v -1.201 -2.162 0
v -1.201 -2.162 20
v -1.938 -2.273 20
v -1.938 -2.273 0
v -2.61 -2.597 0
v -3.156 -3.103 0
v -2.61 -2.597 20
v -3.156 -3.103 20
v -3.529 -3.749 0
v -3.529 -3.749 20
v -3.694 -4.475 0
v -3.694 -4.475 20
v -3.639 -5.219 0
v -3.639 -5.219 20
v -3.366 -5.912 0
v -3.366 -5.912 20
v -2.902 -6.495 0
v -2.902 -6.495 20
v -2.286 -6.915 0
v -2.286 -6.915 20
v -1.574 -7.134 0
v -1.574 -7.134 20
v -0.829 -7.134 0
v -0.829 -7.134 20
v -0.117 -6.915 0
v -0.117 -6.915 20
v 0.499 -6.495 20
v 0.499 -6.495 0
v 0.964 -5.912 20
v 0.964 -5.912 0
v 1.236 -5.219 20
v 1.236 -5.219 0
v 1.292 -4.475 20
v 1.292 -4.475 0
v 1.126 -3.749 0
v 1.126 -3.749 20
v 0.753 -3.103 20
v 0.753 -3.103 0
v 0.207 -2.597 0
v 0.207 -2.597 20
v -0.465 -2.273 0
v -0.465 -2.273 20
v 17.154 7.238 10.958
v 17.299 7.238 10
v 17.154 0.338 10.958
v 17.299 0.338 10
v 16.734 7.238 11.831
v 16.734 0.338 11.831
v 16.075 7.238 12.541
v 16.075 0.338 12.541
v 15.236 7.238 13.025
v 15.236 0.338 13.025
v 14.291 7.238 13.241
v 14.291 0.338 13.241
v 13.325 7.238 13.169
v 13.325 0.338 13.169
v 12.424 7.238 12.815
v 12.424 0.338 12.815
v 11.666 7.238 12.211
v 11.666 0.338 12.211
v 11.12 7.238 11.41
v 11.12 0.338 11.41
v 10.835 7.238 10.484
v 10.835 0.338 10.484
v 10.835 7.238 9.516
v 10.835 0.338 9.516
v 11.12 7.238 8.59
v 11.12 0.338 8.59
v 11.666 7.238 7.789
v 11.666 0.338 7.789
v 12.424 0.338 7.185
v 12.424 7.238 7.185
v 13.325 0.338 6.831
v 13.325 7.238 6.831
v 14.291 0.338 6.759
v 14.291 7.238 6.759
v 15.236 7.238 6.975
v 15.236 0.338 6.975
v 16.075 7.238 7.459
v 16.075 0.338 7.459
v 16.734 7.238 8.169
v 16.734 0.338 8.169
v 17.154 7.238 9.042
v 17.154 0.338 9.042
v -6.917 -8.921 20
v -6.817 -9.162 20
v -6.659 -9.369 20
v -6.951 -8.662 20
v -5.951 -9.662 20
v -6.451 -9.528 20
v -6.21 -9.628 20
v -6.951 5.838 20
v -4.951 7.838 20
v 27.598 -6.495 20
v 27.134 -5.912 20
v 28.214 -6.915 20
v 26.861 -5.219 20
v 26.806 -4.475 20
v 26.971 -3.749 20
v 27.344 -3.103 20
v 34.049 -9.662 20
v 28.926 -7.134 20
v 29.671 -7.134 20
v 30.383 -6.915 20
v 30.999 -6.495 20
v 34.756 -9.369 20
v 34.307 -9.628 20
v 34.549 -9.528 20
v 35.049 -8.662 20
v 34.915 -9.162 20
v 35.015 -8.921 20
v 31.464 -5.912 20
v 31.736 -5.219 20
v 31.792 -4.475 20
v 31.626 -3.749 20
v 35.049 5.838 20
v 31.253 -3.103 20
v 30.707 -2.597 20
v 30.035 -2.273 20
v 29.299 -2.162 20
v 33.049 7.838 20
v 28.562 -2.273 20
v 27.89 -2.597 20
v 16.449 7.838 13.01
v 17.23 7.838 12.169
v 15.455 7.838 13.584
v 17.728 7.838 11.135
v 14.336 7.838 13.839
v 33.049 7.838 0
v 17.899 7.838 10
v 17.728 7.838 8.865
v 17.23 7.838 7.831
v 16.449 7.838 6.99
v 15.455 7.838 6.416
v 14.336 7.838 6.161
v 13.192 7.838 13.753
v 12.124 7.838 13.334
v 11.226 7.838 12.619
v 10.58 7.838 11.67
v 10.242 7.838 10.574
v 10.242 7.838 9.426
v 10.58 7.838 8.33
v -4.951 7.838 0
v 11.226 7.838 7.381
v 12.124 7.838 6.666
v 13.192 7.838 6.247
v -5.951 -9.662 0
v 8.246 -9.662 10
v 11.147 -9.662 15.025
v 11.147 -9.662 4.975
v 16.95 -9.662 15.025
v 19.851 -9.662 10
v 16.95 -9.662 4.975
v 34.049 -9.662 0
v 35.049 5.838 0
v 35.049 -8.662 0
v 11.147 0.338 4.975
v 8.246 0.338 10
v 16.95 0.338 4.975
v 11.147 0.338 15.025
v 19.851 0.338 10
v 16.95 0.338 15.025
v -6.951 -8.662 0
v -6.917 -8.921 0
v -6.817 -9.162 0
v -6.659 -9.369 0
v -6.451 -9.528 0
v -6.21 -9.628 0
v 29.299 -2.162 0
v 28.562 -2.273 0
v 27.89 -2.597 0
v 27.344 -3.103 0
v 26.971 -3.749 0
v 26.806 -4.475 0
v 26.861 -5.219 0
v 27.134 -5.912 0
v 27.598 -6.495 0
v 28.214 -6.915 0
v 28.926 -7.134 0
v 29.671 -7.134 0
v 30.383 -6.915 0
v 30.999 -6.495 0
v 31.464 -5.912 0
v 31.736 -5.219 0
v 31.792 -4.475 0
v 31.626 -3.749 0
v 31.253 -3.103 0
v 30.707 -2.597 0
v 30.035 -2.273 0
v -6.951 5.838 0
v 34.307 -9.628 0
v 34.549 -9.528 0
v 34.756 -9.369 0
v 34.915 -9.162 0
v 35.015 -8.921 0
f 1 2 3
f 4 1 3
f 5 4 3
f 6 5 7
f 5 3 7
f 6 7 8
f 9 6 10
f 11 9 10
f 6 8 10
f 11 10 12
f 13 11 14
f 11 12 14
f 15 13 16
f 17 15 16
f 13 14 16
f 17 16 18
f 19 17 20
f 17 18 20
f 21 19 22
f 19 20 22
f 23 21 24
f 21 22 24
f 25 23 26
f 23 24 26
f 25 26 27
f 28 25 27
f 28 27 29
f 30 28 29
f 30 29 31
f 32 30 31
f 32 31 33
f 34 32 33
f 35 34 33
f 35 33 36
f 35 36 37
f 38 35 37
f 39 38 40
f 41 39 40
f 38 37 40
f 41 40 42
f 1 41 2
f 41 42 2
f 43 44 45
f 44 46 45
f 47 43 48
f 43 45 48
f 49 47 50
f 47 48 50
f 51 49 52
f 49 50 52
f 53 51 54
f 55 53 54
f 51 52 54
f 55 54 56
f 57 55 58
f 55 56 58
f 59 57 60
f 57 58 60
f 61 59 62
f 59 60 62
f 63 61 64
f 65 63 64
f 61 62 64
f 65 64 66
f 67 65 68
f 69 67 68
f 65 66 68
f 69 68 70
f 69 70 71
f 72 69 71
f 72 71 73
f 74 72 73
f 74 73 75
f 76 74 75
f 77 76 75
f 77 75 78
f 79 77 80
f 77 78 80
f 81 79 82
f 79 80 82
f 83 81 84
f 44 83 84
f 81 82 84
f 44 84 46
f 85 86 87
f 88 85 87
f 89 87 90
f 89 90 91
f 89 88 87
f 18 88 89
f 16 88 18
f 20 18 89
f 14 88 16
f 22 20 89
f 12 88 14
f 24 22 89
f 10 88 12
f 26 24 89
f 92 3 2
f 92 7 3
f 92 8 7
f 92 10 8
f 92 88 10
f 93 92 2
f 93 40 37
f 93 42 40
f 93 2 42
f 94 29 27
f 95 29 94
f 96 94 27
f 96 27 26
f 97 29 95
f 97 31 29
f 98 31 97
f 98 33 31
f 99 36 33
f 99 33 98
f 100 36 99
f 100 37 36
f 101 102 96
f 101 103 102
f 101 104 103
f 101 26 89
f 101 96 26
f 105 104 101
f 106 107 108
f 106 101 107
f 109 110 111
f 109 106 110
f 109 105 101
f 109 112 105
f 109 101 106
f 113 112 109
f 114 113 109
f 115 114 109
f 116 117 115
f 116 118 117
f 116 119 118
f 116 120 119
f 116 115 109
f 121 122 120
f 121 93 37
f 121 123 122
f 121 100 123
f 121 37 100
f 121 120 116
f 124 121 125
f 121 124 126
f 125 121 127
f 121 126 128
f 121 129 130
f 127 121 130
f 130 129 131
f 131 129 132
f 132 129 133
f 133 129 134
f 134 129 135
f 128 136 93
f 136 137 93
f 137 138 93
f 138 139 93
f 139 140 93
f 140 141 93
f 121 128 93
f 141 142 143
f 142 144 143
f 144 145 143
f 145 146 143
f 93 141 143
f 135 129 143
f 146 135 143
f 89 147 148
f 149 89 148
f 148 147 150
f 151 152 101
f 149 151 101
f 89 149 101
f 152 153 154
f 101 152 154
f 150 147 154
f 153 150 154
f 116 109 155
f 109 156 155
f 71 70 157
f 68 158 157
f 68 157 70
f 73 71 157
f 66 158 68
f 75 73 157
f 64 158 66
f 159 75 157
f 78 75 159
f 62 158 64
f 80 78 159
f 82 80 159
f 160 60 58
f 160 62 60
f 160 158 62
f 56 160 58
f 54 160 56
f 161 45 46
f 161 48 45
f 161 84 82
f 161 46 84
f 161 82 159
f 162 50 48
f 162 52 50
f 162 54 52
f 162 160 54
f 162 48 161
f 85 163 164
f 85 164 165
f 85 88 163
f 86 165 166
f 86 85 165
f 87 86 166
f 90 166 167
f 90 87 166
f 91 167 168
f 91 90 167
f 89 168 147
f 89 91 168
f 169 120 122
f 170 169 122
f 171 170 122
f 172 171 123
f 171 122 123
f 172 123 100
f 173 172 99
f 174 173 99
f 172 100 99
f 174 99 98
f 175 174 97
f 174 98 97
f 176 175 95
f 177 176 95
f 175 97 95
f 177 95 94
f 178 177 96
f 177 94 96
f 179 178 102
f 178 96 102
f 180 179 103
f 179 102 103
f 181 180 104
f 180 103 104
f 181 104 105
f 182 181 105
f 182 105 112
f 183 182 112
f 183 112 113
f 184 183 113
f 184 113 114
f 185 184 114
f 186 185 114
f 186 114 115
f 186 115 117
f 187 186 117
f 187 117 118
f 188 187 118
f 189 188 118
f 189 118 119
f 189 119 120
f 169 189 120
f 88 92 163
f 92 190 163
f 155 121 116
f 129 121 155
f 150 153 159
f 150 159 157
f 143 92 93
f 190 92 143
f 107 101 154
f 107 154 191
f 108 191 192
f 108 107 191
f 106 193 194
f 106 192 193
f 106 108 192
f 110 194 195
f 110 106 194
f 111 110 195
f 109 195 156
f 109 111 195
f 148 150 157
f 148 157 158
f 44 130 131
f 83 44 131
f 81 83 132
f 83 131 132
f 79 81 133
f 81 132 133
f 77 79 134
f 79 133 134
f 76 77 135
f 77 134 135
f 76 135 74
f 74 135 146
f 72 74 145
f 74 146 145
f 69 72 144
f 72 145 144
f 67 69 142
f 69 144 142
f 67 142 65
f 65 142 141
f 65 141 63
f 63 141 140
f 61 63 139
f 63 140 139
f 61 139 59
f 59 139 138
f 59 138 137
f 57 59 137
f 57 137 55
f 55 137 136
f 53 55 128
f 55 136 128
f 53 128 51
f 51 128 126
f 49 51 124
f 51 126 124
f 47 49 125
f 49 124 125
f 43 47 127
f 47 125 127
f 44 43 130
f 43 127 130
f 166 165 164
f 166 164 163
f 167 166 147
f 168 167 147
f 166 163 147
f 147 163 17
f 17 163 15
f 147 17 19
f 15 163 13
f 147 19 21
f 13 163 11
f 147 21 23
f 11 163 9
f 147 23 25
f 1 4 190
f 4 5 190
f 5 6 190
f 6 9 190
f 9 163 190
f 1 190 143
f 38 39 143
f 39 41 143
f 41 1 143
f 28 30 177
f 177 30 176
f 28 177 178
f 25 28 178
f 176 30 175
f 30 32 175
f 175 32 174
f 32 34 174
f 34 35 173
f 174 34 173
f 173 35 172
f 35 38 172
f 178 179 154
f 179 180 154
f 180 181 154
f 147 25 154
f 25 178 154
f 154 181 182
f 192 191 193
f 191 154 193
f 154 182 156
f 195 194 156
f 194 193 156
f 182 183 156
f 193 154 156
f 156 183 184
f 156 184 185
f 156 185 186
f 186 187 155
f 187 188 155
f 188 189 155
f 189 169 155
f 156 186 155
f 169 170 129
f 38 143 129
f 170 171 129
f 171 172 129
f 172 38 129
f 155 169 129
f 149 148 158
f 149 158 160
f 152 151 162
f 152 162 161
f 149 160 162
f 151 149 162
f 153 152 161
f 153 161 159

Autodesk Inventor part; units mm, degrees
ref_plane "YZ Plane" through (0, 0, 0) normal (1, 0, 0) x (0, 1, 0)
ref_plane "XZ Plane" through (0, 0, 0) normal (0, 1, 0) x (-1, 0, 0)
ref_plane "XY Plane" through (0, 0, 0) normal (0, 0, 1) x (1, 0, 0)
sketch "Szkic1" plane through (0, 0, 0) normal (0, 0, 1) x (1, 0, 0)
  line L0 (-6.9514, -9.6622) -> (35.0486, -9.6622)
  line L1 (35.0486, -9.6622) -> (35.0486, 7.8378)
  line L2 (35.0486, 7.8378) -> (-6.9514, 7.8378)
  line L3 (-6.9514, 7.8378) -> (-6.9514, -9.6622)
  point P0 (0, 0)
  point P1 (-1.2014, -4.6622)
  point P2 (29.2986, -4.6622)
  dimension "d0" = 42
  dimension "d1" = 17.5
  dimension "d2" = 5.75
  dimension "d3" = 5
  dimension "d4" = 5
  dimension "d5" = 5.75
extrude "Wyciągnięcie proste1" add sketch "Szkic1" along normal blind 20
hole "Otwór1" at (-1.2014, -4.6622, 0) at (29.2986, -4.6622, 0) direction (0, 0, 1) diameter 5 end through all
sketch "Szkic2" plane through (-6.9514, -9.6622, 0) normal (0, -1, 0) x (1, 0, 0)
  line L0 (0, 0) -> (42, 0) projected
  line L1 (42, 0) -> (42, 20) projected
  line L2 (0, 20) -> (42, 20) projected
  line L3 (0, 0) -> (0, 20) projected
  circle A0 centre (21, 10) radius 5.025
  line L4 (23.9012, 15.025) -> (26.8024, 10)
  line L5 (26.8024, 10) -> (23.9012, 4.975)
  line L6 (23.9012, 4.975) -> (18.0988, 4.975)
  line L7 (18.0988, 4.975) -> (15.1976, 10)
  line L8 (15.1976, 10) -> (18.0988, 15.025)
  line L9 (18.0988, 15.025) -> (23.9012, 15.025)
  circle A1 centre (21, 10) radius 3.25
  point P0 (6.9514, 0)
  point P1 (21, 15.025)
  dimension "d19" = 10.05
  dimension "d15" = 42
  dimension "d16" = 20
  dimension "d17" = 10
  dimension "d18" = 21
  dimension "d20" = 6.5
extrude "Wyciągnięcie proste2" cut sketch "Szkic2" against normal through all contours A1
extrude "Wyciągnięcie proste3" cut sketch "Szkic2" against normal blind 10 contours A0 | A0 L4 L5 | A0 L9 L4 | L5 L6 A0 | A0 L8 L9 | L6 L7 A0 | A0 L7 L8
chamfer "Faza1" distance 0.6 angle 45 1 edges at (10.7986, 7.8378, 10)
fillet "Zaokrąglenie1" radius 1 2 edges at (-6.9514, -9.6622, 10) (35.0486, -9.6622, 10)
chamfer "Faza2" distance 2 angle 45 2 edges at (-6.9514, 7.8378, 10) (35.0486, 7.8378, 10)
equation "\"d4\" = d3"
equation "\"d5\" = d2"
equation "\"d17\" = 0.5 * d16"
equation "\"d18\" = 0.5 * d15"
properties part number "3DP_ABS_Z_Axis_Screw_Nut_Mount"
